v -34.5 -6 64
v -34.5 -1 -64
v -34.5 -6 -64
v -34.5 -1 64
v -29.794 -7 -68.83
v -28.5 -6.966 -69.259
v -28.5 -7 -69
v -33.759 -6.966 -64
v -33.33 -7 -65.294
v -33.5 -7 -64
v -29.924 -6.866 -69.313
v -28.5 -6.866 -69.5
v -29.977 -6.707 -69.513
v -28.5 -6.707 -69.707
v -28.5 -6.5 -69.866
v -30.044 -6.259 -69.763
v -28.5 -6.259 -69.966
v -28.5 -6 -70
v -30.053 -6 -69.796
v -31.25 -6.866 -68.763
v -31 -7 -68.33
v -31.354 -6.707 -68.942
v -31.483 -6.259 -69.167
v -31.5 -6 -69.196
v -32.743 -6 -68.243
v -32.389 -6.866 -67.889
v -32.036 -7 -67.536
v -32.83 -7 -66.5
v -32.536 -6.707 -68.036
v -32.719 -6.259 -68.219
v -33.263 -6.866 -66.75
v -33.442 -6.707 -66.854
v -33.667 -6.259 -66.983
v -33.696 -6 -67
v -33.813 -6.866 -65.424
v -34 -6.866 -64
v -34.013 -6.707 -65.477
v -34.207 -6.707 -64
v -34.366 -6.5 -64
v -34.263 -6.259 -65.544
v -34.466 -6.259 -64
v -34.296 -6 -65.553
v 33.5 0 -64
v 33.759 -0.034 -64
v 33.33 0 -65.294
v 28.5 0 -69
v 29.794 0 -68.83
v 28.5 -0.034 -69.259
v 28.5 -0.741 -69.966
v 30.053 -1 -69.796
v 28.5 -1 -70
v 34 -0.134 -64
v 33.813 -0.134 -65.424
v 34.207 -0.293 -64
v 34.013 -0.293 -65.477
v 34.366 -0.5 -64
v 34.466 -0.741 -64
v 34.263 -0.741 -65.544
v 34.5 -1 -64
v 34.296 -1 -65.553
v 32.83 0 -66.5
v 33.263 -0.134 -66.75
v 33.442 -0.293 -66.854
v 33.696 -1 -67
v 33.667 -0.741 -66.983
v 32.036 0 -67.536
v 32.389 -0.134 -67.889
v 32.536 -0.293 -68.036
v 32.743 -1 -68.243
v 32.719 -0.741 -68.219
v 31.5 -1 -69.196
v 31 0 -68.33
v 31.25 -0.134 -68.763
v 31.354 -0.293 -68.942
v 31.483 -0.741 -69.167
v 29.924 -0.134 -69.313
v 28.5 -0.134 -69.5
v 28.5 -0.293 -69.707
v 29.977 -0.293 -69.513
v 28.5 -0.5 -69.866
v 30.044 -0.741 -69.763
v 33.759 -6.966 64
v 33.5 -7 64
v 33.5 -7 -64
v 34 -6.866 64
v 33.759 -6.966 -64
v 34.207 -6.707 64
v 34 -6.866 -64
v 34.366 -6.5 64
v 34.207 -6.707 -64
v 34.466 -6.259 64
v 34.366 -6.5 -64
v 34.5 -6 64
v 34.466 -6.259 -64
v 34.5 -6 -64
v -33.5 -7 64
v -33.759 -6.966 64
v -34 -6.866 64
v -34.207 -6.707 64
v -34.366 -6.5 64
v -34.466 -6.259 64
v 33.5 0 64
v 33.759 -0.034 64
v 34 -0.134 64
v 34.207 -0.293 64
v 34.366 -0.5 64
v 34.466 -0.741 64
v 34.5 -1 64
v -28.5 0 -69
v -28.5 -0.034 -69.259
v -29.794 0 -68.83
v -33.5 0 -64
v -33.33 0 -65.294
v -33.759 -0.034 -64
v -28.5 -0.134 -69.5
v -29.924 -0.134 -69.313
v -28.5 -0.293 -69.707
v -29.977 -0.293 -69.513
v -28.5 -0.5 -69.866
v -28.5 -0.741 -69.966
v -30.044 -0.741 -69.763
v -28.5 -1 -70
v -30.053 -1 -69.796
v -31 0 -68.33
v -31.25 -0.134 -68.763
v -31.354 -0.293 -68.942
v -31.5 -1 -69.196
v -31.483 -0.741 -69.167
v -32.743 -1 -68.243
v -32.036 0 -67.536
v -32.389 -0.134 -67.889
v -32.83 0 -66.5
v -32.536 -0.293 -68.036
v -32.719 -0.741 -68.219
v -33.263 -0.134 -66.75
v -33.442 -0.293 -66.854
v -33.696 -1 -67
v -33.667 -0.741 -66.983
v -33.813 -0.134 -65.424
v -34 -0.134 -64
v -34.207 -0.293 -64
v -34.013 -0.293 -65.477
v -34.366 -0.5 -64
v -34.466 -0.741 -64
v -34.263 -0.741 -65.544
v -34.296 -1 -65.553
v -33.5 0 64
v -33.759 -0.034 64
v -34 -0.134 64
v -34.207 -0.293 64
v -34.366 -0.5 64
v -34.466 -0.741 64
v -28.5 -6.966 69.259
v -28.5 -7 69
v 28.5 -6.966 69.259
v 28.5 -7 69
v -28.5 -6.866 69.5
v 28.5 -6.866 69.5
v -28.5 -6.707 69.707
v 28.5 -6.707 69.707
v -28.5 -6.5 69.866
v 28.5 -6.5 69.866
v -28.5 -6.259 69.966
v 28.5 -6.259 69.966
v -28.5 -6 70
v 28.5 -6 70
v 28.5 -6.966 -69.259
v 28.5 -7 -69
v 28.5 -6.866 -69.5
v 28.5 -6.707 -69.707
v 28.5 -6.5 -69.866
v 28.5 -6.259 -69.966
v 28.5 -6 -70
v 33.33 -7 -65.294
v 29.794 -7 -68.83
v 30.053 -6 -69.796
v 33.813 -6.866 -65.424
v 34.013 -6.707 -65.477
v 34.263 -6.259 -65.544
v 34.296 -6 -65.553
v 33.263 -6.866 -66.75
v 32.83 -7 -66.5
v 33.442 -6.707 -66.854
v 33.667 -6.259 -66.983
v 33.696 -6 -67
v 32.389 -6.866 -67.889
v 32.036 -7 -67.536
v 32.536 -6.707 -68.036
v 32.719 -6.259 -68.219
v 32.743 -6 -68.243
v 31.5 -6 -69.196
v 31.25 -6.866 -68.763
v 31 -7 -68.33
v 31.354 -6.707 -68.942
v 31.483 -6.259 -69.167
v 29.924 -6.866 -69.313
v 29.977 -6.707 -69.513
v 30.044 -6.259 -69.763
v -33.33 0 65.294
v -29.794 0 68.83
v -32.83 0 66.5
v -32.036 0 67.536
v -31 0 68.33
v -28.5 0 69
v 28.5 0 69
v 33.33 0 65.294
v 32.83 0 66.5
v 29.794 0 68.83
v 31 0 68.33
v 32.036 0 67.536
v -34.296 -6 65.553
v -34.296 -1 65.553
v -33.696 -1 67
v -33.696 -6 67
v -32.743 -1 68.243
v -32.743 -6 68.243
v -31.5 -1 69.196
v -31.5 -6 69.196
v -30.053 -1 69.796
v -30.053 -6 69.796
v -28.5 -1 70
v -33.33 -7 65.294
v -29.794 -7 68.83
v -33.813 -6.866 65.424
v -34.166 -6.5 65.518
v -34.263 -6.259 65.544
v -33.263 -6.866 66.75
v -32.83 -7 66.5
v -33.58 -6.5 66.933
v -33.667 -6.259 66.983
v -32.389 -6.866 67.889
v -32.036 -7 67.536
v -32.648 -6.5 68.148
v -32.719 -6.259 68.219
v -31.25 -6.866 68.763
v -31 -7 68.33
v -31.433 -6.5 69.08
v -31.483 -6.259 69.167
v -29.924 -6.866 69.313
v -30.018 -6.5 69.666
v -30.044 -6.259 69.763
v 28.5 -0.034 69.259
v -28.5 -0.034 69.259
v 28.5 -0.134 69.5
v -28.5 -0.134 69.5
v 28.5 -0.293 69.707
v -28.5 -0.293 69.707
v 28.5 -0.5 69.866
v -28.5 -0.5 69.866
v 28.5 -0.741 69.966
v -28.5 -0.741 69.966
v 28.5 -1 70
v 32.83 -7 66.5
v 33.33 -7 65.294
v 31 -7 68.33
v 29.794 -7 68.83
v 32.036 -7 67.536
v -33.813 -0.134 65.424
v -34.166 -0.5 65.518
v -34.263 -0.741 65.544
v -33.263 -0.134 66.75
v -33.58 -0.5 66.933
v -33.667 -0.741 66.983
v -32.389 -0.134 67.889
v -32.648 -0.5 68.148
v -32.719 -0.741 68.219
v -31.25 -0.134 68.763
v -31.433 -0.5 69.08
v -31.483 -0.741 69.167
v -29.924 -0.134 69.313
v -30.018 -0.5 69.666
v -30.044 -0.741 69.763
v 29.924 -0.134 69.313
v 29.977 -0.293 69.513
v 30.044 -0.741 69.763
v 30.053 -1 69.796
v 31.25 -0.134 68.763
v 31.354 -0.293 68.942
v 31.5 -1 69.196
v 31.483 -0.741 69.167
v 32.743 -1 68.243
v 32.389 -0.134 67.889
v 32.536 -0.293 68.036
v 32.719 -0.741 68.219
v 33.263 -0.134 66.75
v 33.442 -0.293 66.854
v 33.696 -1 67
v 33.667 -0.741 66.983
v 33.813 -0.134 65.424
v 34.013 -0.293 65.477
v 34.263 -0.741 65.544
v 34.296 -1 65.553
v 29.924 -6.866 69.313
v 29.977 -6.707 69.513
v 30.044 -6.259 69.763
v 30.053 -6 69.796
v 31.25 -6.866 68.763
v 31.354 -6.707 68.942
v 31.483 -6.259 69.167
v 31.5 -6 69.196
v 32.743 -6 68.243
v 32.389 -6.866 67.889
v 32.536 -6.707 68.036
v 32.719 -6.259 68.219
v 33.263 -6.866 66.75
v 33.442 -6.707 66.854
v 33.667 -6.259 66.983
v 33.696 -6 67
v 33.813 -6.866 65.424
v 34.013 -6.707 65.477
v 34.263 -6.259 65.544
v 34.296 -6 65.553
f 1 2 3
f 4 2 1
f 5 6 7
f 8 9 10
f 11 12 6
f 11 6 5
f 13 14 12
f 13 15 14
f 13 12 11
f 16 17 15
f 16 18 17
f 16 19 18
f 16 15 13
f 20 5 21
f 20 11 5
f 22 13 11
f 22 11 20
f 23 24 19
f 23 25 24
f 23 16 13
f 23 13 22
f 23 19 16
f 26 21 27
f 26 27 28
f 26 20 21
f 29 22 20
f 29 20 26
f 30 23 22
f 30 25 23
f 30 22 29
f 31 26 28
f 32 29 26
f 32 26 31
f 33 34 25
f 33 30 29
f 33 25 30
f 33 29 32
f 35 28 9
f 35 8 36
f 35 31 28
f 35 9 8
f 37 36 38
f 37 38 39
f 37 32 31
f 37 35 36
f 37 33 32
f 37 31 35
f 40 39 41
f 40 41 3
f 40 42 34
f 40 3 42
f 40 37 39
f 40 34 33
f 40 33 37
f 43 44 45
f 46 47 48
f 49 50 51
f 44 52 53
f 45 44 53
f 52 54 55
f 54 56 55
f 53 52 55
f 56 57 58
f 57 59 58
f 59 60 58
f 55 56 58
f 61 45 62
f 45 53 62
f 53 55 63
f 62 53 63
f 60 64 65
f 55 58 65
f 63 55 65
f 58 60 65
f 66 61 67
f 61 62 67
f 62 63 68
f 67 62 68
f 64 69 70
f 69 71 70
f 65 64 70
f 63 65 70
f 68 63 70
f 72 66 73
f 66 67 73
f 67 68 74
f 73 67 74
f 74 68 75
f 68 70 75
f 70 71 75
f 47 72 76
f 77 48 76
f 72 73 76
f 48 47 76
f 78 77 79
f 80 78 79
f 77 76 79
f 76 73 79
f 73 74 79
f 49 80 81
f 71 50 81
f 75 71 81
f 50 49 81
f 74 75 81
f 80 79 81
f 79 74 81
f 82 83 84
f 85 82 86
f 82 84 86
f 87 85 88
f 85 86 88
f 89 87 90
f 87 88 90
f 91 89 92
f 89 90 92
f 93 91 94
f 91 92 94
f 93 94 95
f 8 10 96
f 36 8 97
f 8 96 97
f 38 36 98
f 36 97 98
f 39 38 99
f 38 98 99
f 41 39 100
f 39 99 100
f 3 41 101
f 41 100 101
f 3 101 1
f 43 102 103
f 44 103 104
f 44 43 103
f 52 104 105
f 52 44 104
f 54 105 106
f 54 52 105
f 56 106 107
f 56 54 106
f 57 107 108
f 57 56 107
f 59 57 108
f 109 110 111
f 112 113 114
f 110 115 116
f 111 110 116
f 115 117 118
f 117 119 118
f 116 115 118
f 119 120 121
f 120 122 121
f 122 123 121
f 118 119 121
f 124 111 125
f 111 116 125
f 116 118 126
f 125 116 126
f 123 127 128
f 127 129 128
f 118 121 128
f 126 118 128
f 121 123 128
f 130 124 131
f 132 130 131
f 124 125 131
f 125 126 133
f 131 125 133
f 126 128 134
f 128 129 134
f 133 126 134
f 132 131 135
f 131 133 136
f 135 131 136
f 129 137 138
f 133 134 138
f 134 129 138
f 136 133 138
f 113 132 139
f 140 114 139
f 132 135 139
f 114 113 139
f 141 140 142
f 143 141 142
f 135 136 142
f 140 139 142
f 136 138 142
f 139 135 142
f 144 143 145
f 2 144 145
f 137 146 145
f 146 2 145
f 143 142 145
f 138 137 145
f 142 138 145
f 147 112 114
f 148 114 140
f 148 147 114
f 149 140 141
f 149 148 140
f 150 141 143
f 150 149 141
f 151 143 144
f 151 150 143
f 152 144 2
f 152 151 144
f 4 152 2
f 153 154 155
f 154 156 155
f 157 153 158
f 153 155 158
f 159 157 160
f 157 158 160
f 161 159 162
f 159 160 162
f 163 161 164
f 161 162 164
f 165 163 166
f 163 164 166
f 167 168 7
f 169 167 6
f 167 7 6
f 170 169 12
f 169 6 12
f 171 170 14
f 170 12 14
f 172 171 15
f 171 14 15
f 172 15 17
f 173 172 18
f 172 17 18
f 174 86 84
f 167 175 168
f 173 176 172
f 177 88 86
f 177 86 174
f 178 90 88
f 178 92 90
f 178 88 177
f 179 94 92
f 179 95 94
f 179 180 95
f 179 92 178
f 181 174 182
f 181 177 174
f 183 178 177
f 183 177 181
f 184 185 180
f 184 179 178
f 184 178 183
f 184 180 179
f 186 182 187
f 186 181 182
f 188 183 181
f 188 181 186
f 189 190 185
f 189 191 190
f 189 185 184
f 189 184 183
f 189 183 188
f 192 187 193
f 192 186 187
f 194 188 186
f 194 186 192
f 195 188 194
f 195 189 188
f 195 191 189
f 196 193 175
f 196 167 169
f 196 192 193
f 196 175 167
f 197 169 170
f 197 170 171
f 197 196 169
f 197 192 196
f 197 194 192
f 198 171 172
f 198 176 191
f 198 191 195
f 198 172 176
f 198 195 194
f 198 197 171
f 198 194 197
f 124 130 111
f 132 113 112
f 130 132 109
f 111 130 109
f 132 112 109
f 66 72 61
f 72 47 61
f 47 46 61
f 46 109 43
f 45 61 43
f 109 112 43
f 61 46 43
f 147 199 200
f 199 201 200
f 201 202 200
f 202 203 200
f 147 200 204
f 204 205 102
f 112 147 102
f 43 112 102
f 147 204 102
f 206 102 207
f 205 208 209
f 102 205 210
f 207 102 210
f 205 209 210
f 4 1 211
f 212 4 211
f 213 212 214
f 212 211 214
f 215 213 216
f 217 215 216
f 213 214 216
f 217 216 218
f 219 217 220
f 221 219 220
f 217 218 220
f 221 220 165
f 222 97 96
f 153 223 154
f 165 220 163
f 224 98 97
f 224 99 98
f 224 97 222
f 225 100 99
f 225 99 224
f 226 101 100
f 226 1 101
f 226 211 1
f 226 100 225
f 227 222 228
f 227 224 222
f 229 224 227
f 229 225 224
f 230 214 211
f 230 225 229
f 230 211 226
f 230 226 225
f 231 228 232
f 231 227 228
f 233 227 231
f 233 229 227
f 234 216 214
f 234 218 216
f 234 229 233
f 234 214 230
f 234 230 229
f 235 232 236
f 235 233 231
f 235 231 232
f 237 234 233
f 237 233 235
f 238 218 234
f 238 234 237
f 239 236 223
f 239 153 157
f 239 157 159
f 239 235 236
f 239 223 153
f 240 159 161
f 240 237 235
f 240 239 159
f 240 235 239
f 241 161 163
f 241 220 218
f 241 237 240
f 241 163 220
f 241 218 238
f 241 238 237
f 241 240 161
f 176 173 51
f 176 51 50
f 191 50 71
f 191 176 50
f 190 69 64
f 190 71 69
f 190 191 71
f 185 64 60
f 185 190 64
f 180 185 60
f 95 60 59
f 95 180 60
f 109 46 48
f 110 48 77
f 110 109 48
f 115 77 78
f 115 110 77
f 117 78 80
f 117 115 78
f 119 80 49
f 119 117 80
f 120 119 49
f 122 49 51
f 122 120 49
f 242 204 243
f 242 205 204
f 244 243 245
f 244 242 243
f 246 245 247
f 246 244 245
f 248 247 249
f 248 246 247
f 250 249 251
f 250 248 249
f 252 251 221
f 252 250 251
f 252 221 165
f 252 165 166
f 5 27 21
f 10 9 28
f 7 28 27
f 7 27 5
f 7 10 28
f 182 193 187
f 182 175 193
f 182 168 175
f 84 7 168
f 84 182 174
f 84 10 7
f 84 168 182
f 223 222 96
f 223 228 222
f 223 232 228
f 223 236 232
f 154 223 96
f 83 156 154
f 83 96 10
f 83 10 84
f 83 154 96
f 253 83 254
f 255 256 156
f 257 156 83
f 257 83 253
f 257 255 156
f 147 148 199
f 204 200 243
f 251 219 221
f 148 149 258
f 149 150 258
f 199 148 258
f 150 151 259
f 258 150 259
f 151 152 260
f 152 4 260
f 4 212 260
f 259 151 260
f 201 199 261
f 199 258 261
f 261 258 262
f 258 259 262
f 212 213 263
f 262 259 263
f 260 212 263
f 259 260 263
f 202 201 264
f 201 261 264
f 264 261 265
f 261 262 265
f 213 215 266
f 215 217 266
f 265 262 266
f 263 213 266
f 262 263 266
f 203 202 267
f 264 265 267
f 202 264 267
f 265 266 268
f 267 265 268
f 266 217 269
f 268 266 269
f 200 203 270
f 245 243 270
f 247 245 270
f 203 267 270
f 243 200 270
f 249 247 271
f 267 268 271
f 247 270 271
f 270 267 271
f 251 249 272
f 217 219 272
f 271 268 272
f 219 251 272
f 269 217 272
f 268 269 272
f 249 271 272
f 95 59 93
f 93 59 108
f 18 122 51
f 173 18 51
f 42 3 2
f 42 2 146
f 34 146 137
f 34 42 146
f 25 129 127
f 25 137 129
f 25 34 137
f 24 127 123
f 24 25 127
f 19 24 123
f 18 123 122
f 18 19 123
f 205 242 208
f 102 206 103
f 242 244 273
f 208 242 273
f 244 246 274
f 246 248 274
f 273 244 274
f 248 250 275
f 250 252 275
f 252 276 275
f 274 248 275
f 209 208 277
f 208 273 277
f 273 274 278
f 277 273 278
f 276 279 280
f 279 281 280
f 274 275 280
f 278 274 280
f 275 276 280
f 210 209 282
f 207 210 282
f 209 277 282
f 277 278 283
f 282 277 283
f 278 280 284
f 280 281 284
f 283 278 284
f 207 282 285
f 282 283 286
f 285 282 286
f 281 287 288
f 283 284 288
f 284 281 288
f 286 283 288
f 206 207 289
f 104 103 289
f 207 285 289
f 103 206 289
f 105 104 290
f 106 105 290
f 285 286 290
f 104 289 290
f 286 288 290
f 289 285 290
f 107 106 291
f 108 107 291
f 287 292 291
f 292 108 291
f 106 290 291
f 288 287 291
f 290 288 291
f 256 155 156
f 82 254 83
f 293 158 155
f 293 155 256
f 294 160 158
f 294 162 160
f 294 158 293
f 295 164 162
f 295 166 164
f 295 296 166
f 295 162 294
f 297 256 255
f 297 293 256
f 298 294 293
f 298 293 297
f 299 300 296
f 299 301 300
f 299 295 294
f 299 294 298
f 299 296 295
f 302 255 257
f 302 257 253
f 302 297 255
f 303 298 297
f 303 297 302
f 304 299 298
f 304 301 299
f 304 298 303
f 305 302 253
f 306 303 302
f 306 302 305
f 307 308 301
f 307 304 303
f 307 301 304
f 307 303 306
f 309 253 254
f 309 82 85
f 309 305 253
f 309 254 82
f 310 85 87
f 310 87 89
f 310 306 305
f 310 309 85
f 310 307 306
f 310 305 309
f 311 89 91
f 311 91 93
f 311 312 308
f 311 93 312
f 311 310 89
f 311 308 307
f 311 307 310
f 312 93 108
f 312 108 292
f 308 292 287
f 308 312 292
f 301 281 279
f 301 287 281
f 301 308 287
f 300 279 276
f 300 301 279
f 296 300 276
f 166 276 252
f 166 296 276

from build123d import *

# Parameters (mm, degrees)
F0_W     = 69
F0_H     = 140
F1_DEPTH = 7
F2_R     = 6
F3_R     = 1


with BuildPart() as f1:
    # F0 (on Front) → F1 (new body)
    with BuildSketch(Plane.XZ):
        Rectangle(F0_W, F0_H)
    extrude(amount=F1_DEPTH)

    # F2
    f2_edges = [f1.edges().sort_by_distance(p)[0] for p in [
        (34.5, -3.5, 70),
        (-34.5, -3.5, 70),
        (34.5, -3.5, -70),
        (-34.5, -3.5, -70),
    ]]
    fillet(f2_edges, radius=F2_R)

    # F3
    f3_edges = [f1.edges().sort_by_distance(p)[0] for p in [
        (0, -7, 70),
        (0, 0, 70),
    ]]
    fillet(f3_edges, radius=F3_R)


solid = f1.part
